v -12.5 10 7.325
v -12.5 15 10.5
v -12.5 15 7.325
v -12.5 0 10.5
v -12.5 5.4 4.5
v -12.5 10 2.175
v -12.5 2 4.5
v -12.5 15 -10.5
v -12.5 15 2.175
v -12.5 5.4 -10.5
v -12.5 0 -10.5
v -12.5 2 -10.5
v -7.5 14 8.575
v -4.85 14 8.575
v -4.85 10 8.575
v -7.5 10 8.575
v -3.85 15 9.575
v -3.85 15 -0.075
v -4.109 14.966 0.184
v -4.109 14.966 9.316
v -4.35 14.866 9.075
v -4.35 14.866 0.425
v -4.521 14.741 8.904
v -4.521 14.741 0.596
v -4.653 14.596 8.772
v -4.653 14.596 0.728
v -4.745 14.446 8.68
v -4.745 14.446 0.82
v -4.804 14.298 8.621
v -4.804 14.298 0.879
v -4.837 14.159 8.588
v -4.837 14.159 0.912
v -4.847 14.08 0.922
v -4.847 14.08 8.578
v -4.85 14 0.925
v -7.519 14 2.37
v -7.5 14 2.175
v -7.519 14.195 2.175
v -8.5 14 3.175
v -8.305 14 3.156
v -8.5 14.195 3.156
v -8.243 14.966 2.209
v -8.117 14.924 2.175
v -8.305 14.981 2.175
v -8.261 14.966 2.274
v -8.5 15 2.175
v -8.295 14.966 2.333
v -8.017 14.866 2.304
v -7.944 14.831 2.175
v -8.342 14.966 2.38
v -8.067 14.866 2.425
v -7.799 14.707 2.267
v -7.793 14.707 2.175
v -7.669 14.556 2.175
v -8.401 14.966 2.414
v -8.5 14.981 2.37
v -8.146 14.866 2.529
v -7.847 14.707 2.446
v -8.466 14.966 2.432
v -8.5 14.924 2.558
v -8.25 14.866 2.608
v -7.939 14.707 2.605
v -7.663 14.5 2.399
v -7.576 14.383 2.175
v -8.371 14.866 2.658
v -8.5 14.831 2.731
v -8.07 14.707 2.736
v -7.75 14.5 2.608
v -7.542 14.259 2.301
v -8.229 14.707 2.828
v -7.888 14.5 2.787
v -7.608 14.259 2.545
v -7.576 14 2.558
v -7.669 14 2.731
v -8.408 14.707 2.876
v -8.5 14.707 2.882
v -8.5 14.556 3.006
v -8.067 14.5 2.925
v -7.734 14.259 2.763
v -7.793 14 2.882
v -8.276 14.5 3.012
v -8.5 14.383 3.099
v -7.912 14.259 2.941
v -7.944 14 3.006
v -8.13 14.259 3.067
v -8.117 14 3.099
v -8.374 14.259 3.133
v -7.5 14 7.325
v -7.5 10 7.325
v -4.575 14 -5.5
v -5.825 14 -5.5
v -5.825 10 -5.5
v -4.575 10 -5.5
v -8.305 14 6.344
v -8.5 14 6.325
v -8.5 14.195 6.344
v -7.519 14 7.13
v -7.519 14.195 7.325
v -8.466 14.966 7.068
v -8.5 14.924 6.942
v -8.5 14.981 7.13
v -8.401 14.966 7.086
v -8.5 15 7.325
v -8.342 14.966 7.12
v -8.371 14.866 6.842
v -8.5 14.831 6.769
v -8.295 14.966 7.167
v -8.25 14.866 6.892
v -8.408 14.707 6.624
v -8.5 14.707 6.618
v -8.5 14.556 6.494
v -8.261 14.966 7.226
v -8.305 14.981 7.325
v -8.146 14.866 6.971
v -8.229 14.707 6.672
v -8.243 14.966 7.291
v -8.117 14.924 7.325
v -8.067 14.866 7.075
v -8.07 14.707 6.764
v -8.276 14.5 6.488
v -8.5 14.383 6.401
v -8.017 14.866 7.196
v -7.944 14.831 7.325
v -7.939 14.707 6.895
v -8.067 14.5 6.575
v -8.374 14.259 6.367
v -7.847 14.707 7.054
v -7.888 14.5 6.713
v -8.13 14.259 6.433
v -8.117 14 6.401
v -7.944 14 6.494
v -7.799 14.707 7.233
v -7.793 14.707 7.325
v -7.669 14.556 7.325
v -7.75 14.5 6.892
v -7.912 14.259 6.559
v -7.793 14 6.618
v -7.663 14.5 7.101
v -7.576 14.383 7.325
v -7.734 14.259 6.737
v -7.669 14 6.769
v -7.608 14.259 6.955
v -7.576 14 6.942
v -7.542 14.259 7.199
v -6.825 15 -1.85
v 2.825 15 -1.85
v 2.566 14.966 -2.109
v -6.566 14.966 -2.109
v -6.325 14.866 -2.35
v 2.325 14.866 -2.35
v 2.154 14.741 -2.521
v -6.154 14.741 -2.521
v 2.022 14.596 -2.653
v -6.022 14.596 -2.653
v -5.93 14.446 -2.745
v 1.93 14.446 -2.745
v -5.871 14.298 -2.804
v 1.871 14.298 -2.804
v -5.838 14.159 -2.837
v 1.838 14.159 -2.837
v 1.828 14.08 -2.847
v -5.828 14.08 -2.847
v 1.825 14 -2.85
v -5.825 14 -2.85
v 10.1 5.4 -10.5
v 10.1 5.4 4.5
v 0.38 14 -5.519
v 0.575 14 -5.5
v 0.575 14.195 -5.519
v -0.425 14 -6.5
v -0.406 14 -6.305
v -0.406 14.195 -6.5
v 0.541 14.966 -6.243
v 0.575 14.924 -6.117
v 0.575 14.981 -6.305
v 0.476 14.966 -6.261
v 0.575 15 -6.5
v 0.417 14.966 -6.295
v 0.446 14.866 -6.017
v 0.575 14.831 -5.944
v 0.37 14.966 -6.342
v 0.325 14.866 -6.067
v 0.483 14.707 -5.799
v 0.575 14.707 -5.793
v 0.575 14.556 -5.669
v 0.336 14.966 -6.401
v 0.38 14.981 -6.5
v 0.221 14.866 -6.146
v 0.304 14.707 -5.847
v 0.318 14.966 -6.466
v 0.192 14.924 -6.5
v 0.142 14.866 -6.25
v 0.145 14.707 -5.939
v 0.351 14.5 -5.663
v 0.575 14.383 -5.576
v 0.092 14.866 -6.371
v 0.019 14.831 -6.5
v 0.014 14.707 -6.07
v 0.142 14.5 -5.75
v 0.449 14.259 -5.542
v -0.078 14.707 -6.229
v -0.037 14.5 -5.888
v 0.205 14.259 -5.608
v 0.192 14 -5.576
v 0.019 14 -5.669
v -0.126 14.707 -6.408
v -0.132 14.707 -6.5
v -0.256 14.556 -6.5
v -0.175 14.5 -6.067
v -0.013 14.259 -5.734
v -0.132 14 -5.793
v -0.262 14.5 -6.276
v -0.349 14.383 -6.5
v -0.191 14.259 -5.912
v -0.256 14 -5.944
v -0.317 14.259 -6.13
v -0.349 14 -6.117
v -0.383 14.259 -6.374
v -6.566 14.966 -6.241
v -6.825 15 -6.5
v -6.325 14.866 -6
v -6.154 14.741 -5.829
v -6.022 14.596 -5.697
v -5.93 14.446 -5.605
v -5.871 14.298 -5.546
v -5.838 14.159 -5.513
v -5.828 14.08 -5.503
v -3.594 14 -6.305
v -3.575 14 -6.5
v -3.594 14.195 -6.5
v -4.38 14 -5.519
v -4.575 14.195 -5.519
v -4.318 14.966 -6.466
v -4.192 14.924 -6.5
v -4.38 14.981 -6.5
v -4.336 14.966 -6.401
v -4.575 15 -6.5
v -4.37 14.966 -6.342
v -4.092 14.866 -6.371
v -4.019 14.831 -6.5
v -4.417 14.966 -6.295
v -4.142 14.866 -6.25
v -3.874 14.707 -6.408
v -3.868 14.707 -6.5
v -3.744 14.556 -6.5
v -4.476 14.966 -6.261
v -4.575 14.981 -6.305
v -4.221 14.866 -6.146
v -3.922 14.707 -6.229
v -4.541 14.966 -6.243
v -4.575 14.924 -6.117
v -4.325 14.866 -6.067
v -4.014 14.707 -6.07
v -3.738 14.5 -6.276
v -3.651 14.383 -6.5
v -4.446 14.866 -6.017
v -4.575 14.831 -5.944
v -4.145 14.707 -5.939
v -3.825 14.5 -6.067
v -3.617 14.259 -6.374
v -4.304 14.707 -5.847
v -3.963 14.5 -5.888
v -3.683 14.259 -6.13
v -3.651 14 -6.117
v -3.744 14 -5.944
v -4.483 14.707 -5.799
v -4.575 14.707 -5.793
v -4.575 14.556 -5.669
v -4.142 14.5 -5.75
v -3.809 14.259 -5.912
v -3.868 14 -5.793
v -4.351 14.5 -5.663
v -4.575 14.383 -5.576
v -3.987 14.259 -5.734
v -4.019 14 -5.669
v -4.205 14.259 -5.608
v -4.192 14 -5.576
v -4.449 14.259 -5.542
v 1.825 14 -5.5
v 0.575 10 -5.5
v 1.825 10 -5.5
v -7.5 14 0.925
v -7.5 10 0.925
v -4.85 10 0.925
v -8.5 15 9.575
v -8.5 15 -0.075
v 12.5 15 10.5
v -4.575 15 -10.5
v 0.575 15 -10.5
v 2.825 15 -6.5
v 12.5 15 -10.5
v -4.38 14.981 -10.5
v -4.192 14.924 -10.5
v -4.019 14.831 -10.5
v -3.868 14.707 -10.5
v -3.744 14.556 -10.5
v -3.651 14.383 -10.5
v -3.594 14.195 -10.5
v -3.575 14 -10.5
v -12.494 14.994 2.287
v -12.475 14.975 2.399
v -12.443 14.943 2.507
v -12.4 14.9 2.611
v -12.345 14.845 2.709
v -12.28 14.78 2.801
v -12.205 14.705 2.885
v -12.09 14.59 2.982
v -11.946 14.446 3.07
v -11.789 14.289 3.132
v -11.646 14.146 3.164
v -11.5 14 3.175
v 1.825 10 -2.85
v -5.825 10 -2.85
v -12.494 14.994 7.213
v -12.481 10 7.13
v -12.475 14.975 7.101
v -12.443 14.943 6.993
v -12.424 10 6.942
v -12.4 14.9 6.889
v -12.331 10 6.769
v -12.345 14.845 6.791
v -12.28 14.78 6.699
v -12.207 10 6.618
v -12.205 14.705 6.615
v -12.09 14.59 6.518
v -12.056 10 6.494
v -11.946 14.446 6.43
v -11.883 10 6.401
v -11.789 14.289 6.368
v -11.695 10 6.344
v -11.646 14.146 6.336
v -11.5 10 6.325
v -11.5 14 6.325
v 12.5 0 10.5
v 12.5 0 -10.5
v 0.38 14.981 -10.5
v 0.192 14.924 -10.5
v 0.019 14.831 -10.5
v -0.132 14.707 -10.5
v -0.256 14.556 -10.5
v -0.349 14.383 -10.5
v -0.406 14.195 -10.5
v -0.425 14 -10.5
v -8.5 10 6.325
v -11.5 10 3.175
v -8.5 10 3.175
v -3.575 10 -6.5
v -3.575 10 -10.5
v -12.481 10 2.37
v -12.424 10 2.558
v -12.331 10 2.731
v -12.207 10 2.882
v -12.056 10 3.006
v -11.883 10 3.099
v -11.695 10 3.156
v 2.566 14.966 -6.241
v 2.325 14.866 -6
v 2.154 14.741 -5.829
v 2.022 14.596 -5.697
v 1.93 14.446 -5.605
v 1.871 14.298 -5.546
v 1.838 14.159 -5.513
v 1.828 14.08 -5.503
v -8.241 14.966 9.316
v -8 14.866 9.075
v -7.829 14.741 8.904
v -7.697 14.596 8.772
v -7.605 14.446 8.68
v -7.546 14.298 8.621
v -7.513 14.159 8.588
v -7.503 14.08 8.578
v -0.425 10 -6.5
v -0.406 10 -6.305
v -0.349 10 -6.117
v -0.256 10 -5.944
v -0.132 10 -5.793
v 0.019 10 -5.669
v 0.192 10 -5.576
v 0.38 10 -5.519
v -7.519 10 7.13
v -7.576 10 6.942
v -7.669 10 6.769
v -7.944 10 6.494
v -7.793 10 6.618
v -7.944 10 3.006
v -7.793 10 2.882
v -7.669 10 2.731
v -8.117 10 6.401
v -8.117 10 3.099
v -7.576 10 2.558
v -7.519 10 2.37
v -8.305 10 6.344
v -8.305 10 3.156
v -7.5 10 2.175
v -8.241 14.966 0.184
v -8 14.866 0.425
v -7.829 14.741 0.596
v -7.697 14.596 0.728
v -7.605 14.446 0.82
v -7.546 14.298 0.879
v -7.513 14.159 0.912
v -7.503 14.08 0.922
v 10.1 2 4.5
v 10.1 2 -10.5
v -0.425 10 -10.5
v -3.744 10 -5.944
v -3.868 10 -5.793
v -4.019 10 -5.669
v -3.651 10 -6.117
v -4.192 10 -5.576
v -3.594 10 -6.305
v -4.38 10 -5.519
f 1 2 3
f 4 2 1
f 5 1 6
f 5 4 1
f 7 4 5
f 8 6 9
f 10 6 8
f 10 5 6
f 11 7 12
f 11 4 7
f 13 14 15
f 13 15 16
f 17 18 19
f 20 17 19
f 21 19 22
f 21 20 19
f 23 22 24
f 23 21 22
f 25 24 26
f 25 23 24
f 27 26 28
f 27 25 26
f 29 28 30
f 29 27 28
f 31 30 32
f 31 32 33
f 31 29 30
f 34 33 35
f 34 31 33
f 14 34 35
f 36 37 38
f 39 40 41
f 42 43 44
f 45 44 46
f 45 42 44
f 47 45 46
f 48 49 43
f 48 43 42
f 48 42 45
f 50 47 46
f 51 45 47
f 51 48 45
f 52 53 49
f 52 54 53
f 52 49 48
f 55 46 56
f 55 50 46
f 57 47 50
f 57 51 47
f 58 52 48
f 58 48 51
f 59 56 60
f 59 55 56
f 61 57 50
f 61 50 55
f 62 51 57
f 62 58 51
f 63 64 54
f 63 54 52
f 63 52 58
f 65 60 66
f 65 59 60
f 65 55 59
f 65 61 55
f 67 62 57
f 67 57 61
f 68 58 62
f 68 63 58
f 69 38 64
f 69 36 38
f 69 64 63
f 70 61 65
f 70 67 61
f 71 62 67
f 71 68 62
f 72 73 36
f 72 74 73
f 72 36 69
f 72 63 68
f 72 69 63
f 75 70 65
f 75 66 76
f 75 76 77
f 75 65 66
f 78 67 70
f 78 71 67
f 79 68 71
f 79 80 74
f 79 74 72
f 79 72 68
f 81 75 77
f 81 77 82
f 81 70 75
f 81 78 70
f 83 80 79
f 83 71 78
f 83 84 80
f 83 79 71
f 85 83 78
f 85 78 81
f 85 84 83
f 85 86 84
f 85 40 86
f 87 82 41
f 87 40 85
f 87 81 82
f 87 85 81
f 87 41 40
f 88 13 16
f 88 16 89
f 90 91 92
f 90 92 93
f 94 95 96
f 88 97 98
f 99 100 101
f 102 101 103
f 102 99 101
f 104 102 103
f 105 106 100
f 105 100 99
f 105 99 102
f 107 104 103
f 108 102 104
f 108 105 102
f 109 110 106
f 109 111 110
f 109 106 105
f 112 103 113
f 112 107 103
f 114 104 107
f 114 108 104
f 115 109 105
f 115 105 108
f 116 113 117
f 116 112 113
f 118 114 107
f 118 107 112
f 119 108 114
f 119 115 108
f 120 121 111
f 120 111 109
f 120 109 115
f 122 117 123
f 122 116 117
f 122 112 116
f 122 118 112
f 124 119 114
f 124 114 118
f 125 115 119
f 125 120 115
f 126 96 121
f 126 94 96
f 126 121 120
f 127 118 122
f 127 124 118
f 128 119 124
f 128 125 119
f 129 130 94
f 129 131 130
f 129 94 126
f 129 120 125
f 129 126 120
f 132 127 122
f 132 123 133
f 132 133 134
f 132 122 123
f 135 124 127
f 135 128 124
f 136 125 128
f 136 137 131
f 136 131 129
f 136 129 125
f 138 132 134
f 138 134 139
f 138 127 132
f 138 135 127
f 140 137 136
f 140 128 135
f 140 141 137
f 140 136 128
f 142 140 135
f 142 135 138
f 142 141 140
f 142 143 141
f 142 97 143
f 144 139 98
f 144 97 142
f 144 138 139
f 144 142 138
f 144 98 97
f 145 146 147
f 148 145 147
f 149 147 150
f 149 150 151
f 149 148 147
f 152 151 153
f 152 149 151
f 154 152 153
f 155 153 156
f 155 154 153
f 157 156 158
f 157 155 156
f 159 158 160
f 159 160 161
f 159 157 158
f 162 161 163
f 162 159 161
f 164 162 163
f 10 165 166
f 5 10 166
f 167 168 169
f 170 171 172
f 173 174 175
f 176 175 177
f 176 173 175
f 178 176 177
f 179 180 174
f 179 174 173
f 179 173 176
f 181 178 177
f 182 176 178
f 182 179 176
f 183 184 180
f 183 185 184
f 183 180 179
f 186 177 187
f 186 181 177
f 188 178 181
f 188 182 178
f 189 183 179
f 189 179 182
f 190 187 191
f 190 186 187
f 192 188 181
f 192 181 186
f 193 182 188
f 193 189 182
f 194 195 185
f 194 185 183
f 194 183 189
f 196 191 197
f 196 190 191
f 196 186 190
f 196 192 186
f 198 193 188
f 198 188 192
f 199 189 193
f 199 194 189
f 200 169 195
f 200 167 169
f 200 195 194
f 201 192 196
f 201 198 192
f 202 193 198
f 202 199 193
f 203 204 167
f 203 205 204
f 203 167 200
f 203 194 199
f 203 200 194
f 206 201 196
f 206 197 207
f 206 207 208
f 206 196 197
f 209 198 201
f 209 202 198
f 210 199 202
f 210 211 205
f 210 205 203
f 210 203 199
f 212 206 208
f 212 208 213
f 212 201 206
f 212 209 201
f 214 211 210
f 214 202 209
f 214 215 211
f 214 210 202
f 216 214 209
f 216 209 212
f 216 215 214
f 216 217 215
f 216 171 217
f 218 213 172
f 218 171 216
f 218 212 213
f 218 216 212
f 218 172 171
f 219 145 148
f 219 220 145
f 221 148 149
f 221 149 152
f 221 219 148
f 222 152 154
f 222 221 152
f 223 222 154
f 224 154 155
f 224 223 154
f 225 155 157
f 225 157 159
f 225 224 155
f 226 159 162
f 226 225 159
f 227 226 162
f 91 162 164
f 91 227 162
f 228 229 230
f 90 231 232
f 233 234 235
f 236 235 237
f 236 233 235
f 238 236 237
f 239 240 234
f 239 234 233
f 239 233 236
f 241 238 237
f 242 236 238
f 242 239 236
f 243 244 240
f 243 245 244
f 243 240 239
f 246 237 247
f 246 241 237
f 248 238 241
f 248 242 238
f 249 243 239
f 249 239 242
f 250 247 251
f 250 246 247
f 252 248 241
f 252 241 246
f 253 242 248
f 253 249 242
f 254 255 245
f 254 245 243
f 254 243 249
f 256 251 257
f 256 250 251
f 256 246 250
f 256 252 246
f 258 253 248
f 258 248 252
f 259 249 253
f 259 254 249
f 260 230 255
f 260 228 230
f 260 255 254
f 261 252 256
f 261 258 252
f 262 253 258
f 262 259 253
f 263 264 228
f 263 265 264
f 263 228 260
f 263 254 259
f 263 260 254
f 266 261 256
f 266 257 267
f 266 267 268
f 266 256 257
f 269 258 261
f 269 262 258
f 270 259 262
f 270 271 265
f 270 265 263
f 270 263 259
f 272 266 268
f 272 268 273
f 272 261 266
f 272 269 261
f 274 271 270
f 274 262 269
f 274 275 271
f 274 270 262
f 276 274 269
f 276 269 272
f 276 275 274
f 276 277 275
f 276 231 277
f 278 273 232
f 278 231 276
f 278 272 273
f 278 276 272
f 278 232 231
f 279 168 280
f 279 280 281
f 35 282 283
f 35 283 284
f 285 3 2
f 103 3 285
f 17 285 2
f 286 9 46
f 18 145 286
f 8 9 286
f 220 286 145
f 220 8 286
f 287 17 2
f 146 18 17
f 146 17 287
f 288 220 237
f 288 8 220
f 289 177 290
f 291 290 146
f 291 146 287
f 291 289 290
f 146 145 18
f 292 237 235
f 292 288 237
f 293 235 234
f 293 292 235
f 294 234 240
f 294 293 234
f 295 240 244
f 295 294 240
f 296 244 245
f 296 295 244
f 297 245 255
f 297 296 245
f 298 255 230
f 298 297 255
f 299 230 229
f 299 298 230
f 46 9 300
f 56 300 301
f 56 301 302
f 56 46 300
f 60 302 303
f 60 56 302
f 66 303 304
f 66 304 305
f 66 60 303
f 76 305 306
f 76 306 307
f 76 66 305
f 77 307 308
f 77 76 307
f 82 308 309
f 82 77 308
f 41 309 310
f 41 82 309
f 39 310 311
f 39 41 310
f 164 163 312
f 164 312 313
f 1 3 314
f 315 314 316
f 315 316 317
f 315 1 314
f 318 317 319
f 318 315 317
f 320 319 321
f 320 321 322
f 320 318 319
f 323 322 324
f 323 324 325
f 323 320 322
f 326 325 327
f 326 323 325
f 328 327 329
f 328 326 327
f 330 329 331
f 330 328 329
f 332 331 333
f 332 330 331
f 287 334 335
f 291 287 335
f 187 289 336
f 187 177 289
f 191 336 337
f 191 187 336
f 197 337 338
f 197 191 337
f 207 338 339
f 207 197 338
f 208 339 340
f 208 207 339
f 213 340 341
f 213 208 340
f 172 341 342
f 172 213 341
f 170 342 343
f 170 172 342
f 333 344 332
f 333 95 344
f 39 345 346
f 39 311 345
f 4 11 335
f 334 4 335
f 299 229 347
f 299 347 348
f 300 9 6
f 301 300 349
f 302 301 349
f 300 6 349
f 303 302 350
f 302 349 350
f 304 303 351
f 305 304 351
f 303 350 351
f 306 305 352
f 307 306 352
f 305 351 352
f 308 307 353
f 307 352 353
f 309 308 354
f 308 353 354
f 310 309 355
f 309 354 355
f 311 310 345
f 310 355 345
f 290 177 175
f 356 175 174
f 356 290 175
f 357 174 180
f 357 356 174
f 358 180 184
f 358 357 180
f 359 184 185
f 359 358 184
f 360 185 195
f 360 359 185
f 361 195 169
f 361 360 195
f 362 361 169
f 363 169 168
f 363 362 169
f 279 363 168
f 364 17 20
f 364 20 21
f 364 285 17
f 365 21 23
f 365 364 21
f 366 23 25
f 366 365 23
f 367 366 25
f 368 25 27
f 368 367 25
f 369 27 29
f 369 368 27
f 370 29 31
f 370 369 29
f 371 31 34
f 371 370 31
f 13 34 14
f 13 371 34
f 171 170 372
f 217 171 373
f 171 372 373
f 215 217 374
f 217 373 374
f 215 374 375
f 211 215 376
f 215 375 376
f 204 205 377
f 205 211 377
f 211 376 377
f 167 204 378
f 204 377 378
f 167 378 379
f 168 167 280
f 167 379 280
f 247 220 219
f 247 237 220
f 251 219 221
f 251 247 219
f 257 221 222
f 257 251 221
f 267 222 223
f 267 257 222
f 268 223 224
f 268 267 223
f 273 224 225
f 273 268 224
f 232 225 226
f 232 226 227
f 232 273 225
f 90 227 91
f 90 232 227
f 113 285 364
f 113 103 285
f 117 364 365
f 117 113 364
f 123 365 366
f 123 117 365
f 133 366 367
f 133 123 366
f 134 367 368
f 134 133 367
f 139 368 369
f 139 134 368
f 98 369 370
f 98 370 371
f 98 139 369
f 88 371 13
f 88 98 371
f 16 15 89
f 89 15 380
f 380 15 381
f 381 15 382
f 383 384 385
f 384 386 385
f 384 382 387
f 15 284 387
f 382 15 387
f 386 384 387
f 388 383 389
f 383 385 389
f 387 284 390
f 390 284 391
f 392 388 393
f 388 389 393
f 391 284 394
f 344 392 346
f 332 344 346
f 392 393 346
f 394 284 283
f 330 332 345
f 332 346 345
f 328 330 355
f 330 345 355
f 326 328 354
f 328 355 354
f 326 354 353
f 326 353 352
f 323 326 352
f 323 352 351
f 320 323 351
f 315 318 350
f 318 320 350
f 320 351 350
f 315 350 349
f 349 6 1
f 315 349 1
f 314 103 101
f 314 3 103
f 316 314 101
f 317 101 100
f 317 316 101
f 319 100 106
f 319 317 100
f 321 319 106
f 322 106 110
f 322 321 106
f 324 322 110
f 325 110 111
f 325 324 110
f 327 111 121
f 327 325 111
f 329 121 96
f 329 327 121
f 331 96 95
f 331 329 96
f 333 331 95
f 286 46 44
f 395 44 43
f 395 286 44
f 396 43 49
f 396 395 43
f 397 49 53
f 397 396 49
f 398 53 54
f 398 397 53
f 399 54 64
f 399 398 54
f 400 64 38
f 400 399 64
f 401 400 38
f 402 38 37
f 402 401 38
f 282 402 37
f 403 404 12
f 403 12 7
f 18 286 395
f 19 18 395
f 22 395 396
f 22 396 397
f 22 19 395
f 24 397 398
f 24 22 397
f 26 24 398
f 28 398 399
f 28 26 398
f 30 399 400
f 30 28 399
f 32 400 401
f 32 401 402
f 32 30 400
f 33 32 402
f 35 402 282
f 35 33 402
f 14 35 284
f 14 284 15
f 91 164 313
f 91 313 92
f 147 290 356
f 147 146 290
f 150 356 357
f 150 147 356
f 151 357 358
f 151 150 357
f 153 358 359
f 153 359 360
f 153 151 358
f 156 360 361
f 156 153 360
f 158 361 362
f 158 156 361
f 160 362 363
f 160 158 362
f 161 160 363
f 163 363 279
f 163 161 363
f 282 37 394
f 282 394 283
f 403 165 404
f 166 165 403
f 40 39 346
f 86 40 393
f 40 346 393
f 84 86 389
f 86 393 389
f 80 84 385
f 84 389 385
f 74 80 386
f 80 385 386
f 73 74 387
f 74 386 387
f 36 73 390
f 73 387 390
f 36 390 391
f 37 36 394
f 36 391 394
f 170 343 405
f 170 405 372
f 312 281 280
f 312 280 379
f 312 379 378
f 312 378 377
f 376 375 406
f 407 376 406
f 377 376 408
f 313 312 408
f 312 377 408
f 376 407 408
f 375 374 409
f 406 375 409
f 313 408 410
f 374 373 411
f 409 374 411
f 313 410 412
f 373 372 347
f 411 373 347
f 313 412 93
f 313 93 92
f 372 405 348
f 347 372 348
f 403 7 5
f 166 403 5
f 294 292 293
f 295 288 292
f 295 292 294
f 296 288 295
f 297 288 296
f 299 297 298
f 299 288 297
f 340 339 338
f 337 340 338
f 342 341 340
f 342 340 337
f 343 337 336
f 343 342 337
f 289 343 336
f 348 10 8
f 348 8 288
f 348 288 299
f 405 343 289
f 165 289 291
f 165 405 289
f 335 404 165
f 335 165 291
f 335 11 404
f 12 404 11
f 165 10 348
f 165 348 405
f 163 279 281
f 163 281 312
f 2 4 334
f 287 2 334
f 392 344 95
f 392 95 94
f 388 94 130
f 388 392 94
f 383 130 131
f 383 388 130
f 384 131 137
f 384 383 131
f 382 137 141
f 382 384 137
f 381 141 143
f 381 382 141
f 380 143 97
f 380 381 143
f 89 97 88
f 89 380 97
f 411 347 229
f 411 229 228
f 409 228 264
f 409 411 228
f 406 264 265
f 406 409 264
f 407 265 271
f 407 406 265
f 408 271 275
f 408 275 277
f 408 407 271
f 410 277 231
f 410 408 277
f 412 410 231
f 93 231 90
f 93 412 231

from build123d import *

# Parameters (mm, degrees)
SKETCH1_W           = 25
SKETCH1_H           = 21
BOSS_EXTRUDE1_DEPTH = 15
SKETCH2_W           = 15
SKETCH2_H           = 3.4
CUT_EXTRUDE1_DEPTH  = 22.6
CUT_EXTRUDE2_DEPTH  = 5
FILLET1_R           = 1


with BuildPart() as part:
    # Sketch1 → Boss-Extrude1 (new body)
    with BuildSketch(Plane(origin=(0, 0, 0), x_dir=(1, 0, 0), z_dir=(0, 1, 0))):
        Rectangle(SKETCH1_W, SKETCH1_H)
    extrude(amount=BOSS_EXTRUDE1_DEPTH)

    # Sketch2 → Cut-Extrude1 (cut)
    with BuildSketch(Plane.ZY.offset(12.5)):
        with Locations((-3, 3.7)):
            Rectangle(SKETCH2_W, SKETCH2_H)
    extrude(amount=-CUT_EXTRUDE1_DEPTH, mode=Mode.SUBTRACT)

    # Sketch3 → Cut-Extrude2 (cut)
    with BuildSketch(Plane(origin=(0, 15, 0), x_dir=(1, 0, 0), z_dir=(0, 1, 0))):
        Polygon((-4.85, -0.925), (-4.85, -8.575), (-7.5, -8.575), (-7.5, -6.325), (-12.5, -6.325), (-12.5, -3.175), (-7.5, -3.175), (-7.5, -0.925), align=None)
        Polygon((-3.575, 10.5), (-0.425, 10.5), (-0.425, 5.5), (1.825, 5.5), (1.825, 2.85), (-5.825, 2.85), (-5.825, 5.5), (-3.575, 5.5), align=None)
    extrude(amount=-CUT_EXTRUDE2_DEPTH, mode=Mode.SUBTRACT)

    # Fillet1
    fillet1_edges = [part.edges().sort_by_distance(p)[0] for p in [
        (-7.5, 12.5, 6.325),
        (-12.5, 12.5, 6.325),
        (-12.5, 12.5, 3.175),
        (-7.5, 12.5, 3.175),
        (-6.175, 15, 0.925),
        (-7.5, 15, 2.05),
        (-10, 15, 3.175),
        (-10, 15, 6.325),
        (-7.5, 15, 7.45),
        (-6.175, 15, 8.575),
        (-4.85, 15, 4.75),
        (-3.575, 12.5, -5.5),
        (-0.425, 12.5, -5.5),
        (-3.575, 15, -8),
        (-4.7, 15, -5.5),
        (-5.825, 15, -4.175),
        (-2, 15, -2.85),
        (1.825, 15, -4.175),
        (0.7, 15, -5.5),
        (-0.425, 15, -8),
    ]]
    fillet(fillet1_edges, radius=FILLET1_R)


solid = part.part
